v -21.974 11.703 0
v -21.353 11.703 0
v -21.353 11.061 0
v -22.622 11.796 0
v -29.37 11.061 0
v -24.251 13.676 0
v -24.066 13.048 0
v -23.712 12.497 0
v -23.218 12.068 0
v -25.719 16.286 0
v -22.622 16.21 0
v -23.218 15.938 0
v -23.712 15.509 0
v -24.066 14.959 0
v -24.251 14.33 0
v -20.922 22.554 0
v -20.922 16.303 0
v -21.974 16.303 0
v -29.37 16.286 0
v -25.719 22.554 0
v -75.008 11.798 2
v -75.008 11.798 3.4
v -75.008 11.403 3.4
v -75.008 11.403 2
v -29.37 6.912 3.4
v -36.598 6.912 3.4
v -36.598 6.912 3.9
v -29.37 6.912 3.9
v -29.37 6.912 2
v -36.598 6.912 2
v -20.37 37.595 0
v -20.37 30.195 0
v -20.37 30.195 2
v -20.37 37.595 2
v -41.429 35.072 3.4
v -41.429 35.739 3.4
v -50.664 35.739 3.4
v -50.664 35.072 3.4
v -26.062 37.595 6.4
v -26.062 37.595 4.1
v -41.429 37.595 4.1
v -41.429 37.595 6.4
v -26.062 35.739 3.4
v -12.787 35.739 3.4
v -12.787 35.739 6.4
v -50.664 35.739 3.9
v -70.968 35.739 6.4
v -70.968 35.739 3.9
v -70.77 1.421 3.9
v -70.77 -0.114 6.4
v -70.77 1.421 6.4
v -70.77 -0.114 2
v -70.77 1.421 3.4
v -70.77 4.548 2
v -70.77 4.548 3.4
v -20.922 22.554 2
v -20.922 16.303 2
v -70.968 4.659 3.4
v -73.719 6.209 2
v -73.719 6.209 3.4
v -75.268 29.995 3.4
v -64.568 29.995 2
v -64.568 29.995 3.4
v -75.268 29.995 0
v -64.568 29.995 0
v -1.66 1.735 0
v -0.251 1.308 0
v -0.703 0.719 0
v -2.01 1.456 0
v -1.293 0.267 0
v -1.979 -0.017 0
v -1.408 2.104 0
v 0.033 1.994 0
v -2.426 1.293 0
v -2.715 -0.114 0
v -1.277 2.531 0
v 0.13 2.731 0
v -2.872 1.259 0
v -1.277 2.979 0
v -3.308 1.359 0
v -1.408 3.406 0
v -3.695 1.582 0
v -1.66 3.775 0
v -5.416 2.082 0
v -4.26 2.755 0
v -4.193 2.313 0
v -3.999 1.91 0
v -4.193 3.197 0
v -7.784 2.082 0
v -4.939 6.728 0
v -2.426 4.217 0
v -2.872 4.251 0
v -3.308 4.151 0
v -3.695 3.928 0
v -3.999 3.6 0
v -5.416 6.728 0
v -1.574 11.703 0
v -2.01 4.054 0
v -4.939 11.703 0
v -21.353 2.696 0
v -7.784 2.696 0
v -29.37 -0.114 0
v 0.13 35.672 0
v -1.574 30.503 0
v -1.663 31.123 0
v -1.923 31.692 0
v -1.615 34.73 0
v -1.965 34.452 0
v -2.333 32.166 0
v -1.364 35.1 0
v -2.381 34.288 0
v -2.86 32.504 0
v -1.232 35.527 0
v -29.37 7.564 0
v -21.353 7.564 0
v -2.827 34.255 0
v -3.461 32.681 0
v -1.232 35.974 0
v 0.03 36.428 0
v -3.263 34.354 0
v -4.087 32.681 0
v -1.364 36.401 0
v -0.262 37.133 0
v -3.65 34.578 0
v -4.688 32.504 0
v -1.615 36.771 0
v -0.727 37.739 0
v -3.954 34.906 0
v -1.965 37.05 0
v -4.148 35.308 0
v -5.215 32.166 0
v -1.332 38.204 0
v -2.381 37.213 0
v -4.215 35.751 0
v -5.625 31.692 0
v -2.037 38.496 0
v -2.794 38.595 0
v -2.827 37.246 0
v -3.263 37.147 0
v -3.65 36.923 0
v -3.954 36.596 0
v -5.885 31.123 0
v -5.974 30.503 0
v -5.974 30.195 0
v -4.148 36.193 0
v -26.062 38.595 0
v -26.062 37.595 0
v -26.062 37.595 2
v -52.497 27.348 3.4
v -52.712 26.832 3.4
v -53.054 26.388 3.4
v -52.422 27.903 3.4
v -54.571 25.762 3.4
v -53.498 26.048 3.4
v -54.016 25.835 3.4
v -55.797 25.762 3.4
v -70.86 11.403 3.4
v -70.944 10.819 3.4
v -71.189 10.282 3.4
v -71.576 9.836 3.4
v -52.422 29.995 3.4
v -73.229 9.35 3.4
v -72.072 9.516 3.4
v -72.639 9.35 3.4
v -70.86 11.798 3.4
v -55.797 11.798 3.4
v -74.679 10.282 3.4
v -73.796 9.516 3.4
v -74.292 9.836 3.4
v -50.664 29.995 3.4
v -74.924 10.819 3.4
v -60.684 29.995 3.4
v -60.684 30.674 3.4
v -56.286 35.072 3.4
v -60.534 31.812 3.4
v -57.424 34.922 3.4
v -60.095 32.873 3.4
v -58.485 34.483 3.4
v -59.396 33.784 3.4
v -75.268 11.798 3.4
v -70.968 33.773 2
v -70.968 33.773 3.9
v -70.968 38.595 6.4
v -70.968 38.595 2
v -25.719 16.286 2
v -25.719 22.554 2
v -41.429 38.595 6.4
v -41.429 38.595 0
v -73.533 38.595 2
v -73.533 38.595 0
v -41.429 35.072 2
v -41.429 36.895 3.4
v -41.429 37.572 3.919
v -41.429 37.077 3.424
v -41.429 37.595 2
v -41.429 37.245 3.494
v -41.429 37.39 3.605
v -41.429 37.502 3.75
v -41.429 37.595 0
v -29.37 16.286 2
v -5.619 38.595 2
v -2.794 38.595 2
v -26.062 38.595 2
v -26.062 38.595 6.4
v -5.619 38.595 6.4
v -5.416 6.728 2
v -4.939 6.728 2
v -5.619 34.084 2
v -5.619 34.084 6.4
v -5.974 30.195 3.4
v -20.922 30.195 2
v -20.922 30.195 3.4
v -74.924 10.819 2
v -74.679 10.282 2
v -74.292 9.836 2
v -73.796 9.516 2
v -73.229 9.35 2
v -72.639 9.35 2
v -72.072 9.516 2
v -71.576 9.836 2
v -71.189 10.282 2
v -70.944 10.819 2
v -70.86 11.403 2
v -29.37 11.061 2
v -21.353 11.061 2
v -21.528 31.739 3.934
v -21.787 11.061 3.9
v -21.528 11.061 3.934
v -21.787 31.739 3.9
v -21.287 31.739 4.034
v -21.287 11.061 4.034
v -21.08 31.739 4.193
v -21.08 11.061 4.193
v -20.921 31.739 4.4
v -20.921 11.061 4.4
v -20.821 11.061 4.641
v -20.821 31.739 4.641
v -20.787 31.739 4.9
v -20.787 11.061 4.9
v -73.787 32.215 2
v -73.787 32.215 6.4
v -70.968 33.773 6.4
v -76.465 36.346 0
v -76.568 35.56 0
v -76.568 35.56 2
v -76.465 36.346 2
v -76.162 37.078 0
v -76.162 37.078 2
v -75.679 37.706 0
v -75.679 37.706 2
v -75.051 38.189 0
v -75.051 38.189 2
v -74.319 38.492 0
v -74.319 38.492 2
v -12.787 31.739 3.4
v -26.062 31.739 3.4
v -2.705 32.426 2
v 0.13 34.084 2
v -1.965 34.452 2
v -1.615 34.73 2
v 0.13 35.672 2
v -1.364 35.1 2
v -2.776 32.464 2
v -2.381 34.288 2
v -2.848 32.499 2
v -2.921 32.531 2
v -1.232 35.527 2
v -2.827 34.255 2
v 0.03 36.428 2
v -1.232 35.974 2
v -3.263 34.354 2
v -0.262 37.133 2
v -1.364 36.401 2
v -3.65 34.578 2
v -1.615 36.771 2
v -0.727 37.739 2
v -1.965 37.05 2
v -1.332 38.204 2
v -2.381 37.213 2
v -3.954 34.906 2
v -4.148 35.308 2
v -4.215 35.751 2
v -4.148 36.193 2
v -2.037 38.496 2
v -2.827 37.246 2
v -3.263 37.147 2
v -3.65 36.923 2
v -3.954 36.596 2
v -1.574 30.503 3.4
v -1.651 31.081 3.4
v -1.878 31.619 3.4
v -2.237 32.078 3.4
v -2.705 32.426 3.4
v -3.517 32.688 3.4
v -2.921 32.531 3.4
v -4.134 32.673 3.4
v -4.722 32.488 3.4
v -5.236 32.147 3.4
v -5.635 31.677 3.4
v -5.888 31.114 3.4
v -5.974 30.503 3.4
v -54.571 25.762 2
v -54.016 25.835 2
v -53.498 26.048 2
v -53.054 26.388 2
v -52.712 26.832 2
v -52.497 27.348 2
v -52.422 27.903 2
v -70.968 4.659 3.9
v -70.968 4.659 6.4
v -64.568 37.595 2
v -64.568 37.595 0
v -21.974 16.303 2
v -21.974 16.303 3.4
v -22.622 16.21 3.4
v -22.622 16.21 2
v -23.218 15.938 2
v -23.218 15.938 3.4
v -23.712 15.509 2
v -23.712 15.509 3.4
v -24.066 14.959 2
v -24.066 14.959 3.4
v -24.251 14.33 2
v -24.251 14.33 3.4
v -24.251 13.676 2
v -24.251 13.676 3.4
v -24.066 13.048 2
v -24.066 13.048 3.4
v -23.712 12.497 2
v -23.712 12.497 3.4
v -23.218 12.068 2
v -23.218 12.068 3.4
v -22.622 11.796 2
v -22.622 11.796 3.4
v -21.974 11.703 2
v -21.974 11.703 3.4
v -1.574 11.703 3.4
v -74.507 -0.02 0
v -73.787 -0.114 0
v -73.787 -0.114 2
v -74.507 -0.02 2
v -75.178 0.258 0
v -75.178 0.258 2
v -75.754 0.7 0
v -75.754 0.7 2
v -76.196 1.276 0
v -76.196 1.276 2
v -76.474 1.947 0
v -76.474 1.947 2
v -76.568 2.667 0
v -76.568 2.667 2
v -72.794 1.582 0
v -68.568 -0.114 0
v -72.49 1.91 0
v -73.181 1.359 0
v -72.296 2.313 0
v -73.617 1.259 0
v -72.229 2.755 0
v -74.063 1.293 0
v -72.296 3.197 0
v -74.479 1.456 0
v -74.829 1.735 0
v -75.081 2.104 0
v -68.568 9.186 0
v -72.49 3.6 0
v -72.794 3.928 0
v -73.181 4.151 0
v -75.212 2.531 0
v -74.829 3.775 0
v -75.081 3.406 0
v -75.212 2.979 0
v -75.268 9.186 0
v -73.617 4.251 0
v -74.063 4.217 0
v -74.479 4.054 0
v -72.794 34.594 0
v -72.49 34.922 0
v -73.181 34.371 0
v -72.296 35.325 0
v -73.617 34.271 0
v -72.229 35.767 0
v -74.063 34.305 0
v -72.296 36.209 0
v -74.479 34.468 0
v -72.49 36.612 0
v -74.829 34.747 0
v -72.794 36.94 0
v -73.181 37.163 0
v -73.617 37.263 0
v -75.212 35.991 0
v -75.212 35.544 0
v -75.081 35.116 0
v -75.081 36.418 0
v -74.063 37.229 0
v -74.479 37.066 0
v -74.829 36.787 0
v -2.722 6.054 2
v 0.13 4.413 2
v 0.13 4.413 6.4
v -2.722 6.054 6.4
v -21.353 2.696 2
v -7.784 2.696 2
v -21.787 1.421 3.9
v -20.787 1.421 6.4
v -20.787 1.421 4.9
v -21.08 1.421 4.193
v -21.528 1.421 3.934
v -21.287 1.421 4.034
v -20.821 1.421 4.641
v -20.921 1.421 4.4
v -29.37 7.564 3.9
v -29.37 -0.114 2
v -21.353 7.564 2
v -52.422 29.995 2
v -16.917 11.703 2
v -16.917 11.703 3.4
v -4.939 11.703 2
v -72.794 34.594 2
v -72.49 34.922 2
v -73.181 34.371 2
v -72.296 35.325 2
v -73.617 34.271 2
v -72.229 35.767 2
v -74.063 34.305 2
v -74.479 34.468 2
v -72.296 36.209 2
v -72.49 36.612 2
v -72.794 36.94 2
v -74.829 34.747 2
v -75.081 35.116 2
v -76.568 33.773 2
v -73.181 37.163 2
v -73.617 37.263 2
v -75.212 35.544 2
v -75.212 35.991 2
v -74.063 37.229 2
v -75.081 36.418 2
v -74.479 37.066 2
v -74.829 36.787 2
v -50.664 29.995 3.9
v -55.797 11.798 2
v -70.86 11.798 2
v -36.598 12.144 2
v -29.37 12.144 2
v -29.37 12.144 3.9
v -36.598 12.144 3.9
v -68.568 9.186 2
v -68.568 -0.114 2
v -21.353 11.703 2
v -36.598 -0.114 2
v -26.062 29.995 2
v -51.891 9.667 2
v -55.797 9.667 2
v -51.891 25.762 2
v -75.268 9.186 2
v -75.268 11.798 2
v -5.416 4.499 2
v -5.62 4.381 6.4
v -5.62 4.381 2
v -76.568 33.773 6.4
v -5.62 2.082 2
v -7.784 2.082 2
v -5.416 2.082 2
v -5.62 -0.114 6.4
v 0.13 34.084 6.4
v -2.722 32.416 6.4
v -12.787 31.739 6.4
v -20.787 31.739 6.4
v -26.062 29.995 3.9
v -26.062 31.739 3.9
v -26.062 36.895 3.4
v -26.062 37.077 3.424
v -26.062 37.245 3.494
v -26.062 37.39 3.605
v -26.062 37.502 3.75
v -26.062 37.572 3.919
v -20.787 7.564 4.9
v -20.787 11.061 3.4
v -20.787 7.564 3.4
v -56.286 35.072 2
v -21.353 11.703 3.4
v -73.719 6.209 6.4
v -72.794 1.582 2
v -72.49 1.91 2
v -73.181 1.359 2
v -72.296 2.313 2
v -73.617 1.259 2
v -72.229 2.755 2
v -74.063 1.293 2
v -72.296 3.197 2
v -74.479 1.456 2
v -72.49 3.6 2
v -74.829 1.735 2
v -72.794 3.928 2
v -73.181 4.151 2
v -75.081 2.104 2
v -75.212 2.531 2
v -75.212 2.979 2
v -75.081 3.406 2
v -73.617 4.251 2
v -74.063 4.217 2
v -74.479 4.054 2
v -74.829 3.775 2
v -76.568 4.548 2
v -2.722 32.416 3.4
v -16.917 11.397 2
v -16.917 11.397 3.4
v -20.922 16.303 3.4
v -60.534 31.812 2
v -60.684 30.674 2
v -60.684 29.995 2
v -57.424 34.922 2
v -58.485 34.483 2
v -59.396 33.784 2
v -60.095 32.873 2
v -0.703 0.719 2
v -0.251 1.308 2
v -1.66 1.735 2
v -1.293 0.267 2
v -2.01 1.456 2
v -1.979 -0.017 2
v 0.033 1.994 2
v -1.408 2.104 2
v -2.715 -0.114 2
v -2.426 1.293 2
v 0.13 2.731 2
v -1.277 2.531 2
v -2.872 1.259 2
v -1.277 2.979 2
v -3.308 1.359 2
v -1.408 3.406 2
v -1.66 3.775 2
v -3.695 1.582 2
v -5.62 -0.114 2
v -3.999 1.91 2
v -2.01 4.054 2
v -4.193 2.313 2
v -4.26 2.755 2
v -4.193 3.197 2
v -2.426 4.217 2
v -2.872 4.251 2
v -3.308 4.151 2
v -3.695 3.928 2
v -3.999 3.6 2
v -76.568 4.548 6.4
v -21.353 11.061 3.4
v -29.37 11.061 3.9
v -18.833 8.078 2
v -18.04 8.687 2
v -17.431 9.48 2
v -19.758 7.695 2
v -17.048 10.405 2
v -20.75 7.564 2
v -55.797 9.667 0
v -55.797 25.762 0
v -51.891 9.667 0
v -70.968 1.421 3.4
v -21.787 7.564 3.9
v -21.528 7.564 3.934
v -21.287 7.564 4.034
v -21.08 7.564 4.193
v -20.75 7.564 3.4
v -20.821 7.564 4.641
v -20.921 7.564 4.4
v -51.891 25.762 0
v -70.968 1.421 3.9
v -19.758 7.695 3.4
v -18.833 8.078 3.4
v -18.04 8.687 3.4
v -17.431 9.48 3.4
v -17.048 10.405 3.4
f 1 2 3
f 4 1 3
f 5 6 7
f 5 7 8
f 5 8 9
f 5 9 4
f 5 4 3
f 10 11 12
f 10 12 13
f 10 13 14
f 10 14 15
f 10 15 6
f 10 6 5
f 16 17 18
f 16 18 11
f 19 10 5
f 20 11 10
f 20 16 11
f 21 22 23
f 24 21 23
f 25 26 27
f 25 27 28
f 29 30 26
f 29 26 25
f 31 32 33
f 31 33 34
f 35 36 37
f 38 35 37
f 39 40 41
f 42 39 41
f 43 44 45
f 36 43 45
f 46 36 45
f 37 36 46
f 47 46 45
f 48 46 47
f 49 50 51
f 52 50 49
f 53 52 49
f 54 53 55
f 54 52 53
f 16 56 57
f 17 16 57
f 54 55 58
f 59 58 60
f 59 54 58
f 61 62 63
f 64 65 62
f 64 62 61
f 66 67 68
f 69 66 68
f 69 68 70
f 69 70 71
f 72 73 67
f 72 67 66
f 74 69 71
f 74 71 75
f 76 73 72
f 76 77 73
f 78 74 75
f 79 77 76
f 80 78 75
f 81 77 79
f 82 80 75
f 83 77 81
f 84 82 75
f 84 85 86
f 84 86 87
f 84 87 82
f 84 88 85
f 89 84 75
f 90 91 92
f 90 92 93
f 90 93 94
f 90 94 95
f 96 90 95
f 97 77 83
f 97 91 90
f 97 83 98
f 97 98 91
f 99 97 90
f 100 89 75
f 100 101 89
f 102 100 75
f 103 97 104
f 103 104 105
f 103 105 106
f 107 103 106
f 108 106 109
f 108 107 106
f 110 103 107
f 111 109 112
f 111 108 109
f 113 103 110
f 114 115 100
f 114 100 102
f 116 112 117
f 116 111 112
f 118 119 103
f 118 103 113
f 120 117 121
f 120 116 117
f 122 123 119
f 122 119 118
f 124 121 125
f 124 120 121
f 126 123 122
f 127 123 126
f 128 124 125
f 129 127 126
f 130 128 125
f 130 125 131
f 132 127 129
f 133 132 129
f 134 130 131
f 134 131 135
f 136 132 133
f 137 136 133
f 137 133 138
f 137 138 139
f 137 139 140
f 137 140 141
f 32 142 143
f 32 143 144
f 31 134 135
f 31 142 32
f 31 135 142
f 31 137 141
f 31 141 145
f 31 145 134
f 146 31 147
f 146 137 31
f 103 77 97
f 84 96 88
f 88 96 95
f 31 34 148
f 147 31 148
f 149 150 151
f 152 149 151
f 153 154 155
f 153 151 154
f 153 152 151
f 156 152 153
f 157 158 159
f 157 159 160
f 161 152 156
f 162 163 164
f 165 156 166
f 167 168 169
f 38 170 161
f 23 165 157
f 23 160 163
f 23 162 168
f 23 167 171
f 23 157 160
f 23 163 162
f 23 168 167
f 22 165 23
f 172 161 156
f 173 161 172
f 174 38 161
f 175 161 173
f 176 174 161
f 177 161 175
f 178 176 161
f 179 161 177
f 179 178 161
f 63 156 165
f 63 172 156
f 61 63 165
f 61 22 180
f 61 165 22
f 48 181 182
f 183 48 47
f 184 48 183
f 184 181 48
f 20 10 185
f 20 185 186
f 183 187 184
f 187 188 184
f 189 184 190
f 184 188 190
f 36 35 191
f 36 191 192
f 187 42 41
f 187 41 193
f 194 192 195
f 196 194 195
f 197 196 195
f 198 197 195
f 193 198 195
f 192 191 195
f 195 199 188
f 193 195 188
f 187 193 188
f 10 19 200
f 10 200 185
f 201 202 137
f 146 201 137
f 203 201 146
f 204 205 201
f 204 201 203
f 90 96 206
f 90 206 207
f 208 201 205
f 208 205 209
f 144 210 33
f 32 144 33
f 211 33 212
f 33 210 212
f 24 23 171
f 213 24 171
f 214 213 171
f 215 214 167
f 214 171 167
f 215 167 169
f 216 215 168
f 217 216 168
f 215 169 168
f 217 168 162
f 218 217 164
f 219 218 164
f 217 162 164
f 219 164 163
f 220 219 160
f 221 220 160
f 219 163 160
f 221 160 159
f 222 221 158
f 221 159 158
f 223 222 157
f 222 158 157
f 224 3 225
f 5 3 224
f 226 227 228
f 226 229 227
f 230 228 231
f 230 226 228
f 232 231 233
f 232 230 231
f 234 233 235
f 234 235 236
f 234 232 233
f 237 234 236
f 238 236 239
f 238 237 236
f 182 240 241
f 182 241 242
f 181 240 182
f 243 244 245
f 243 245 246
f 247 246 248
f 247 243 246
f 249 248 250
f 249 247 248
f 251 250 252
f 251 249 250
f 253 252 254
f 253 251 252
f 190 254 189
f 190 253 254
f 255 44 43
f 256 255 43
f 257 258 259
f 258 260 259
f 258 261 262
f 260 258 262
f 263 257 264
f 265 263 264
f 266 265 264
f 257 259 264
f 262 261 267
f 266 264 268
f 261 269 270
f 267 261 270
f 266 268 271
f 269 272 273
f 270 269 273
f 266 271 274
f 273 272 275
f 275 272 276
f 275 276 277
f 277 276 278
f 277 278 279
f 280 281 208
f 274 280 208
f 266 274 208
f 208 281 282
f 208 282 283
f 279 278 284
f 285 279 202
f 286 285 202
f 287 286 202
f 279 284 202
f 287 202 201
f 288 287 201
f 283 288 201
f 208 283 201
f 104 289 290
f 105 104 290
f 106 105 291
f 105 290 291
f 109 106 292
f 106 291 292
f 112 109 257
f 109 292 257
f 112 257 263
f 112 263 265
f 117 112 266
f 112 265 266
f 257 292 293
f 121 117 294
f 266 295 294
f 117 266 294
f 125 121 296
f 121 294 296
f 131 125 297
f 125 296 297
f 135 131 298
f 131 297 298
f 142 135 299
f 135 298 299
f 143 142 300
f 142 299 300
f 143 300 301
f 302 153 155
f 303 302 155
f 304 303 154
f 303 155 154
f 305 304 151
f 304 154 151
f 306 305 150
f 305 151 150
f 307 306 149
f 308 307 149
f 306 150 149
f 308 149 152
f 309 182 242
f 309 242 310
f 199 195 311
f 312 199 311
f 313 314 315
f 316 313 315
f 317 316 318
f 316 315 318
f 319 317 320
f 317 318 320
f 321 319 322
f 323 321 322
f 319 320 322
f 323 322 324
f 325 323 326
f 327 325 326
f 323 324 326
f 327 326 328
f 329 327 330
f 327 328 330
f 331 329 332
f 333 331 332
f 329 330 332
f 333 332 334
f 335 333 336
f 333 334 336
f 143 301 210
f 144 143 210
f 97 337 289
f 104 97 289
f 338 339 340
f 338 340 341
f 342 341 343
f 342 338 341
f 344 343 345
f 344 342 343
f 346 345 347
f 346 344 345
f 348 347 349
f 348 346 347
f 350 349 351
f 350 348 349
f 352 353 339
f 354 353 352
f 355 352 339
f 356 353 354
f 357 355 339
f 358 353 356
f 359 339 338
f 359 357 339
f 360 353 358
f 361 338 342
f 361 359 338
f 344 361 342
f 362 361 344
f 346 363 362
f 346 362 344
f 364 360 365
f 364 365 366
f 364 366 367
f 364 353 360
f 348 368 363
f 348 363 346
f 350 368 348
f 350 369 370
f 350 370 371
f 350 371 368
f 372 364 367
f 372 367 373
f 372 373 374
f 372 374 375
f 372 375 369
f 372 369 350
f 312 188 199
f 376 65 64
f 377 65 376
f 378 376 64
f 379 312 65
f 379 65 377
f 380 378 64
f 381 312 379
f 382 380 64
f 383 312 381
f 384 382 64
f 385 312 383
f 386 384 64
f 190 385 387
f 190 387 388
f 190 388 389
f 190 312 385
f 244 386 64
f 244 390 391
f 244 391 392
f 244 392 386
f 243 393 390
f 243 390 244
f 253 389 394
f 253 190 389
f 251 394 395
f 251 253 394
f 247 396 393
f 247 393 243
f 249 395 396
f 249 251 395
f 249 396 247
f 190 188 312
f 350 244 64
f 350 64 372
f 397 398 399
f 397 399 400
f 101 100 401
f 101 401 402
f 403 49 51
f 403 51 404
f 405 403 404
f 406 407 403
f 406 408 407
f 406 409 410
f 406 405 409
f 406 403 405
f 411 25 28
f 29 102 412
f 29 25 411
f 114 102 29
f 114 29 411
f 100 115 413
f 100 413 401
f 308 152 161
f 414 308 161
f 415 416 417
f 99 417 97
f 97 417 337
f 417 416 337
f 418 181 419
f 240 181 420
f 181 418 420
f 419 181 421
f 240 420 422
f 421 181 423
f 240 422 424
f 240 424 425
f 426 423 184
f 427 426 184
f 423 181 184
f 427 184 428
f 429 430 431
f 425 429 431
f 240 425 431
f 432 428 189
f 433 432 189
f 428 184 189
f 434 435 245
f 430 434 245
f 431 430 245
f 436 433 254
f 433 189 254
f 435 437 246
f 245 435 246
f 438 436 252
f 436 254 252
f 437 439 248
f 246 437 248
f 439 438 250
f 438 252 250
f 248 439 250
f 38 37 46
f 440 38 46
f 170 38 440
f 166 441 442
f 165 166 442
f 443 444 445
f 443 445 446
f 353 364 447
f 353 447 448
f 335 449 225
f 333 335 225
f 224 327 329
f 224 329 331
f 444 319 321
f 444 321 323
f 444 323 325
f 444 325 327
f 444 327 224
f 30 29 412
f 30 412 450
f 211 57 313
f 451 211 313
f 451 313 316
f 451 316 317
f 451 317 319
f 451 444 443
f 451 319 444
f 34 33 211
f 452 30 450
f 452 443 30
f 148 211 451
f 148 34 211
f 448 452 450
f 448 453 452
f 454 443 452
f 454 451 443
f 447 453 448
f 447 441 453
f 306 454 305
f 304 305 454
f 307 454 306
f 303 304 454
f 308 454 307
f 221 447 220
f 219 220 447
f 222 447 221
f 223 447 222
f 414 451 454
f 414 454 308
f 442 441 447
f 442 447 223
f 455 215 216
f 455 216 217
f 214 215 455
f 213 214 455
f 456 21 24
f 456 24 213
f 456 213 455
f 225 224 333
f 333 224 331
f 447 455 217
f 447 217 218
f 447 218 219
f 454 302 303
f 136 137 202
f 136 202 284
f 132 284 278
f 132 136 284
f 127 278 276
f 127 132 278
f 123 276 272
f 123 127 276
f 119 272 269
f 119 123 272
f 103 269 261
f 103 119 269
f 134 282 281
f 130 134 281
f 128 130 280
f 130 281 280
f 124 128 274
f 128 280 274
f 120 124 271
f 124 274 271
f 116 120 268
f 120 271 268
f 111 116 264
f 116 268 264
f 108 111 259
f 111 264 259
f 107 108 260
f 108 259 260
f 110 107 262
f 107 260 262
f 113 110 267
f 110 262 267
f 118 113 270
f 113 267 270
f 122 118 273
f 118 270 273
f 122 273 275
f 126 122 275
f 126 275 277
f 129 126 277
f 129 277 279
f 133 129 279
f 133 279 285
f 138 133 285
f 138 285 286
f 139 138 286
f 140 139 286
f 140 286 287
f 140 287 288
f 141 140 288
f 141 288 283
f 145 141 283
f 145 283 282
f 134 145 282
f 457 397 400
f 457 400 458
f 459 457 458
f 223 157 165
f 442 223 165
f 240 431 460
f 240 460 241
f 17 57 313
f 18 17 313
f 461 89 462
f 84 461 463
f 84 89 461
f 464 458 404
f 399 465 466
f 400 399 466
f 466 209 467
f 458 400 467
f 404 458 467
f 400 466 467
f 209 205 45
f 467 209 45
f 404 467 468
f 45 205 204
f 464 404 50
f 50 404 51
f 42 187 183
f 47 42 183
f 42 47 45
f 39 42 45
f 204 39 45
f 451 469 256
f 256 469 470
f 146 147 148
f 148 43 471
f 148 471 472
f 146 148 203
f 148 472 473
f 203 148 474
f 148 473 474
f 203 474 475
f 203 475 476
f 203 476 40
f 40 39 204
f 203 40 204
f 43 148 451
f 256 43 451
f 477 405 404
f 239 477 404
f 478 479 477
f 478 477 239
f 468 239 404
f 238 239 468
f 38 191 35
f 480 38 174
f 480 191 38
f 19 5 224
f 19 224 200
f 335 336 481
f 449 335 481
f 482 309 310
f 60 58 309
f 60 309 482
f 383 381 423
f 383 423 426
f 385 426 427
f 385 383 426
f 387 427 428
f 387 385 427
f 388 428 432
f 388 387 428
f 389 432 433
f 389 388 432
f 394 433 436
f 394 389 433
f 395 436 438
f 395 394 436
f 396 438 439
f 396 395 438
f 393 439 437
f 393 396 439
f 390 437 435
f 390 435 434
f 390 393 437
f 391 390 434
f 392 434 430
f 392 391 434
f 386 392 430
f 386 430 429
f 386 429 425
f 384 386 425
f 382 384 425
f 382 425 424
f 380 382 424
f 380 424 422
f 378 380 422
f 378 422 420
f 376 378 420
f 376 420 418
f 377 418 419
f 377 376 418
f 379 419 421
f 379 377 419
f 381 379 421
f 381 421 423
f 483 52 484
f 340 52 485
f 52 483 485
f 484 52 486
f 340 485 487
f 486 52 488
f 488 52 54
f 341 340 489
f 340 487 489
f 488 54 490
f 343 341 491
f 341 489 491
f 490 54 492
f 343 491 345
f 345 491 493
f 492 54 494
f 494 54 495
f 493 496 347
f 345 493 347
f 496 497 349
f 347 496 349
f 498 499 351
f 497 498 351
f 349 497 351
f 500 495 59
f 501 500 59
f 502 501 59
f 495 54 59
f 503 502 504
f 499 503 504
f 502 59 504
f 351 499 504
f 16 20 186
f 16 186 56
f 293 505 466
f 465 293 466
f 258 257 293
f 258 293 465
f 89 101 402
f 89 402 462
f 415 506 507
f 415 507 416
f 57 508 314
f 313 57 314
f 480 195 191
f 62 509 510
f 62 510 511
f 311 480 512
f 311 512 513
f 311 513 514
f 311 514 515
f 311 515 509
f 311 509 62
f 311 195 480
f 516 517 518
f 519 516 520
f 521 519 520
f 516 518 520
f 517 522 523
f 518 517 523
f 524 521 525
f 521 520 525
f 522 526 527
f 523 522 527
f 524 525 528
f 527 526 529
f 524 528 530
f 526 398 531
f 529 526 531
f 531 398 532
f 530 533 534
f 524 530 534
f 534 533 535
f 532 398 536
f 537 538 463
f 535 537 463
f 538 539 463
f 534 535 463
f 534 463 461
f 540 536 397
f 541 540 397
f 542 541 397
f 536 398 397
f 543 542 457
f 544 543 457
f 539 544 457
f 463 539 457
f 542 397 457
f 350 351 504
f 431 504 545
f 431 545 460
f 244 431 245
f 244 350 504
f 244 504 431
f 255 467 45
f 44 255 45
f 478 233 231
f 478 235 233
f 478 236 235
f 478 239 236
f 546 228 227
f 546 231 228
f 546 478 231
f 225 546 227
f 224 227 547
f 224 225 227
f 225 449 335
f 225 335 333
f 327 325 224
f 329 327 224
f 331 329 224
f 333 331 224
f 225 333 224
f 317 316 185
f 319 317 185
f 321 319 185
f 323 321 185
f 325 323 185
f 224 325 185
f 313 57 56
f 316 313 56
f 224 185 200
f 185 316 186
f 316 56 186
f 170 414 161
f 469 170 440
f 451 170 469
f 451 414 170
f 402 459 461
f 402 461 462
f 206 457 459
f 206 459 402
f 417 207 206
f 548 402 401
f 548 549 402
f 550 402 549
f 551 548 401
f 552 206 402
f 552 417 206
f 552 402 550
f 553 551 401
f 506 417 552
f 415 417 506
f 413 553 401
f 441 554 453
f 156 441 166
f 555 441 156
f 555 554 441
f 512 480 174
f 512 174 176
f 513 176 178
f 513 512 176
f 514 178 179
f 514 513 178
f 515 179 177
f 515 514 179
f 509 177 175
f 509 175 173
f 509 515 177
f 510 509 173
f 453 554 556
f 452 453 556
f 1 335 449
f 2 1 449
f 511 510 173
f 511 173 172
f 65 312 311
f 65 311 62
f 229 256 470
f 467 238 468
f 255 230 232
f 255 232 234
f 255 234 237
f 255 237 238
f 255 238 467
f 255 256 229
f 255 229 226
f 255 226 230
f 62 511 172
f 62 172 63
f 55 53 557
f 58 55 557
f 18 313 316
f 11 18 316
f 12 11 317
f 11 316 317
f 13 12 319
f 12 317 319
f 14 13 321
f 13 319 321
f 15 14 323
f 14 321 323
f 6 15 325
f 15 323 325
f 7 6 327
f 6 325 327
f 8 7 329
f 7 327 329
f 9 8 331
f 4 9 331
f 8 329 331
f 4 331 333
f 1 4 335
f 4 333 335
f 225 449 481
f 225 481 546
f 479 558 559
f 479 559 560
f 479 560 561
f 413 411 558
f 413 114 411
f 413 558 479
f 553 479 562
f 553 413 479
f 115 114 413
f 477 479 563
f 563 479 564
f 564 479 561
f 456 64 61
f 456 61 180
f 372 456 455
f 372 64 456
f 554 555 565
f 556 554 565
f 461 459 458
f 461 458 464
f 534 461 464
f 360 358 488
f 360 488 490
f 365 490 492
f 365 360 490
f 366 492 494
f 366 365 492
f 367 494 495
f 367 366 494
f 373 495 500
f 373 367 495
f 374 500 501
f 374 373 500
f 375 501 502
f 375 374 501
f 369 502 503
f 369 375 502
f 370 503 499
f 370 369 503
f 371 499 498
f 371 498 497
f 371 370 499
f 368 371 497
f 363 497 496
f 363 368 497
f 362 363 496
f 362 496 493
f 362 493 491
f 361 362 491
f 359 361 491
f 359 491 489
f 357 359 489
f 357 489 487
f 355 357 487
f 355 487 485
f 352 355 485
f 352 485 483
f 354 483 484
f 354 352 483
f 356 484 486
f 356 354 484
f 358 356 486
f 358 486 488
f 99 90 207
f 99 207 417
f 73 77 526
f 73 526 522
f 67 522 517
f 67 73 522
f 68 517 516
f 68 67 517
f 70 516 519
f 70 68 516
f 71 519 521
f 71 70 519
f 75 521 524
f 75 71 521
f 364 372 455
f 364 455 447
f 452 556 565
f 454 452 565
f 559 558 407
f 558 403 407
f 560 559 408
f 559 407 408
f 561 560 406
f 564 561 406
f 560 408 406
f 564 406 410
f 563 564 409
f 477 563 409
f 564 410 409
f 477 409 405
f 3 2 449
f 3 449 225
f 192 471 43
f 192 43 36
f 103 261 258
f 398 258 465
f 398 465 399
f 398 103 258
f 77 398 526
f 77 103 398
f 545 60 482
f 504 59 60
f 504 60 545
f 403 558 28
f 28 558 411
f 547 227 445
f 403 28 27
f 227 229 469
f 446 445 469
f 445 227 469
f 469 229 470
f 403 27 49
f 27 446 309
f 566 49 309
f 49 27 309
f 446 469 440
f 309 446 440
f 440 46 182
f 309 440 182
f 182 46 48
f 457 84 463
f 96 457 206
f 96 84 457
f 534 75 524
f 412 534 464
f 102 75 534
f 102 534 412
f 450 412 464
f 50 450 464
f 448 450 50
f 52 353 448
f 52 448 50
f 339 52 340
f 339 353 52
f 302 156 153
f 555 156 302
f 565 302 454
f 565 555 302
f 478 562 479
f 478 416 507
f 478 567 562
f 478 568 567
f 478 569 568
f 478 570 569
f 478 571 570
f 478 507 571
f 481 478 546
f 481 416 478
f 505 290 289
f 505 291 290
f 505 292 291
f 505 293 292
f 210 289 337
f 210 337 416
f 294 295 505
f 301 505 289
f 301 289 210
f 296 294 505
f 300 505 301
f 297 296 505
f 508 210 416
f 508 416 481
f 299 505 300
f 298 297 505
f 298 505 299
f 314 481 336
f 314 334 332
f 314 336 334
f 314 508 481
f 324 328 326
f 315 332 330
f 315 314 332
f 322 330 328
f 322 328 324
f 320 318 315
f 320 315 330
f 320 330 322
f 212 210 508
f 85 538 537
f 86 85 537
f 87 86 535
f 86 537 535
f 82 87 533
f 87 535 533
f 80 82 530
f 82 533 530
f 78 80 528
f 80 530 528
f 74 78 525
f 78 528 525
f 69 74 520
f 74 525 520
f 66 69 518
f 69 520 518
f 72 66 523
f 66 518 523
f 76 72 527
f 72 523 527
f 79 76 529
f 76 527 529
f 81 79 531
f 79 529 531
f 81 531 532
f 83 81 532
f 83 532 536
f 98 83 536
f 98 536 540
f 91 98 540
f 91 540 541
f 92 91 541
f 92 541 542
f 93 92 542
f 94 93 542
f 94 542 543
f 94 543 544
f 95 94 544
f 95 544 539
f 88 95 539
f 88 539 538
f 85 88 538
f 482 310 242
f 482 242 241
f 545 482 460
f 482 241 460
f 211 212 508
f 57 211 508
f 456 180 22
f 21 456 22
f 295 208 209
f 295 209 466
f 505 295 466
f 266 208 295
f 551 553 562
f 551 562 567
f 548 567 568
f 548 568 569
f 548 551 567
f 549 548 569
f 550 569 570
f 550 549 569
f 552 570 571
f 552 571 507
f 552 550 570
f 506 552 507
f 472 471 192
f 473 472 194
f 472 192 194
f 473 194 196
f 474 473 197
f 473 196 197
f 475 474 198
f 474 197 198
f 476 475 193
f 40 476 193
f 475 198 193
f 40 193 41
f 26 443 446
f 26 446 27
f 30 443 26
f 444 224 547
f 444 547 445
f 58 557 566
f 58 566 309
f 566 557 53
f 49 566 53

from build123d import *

# Parameters (mm, degrees)
SKETCH_1_R          = 1.5
EXTRUDE_1_DEPTH     = 2
EXTRUDE_1_2_DEPTH   = 2
EXTRUDE_1_3_DEPTH   = 2
SKETCH_1_W          = 4.106423221
SKETCH_1_H          = 16.094809644
EXTRUDE_1_4_DEPTH   = 2
EXTRUDE_2_DEPTH     = 1.4
SKETCH_3_W          = 7.227966662
SKETCH_3_H          = 7.026031467
EXTRUDE_3_DEPTH     = 1.4
SKETCH_4_R          = 1.5
CUT_EXTRUDE_1_DEPTH = 4
EXTRUDE_4_DEPTH     = 3
SKETCH_6_W          = 8
SKETCH_6_H          = 4
CUT_EXTRUDE_2_DEPTH = 3
SKETCH_7_W          = 15.36645454
SKETCH_7_H          = 1
CUT_EXTRUDE_3_DEPTH = 10
FILLET_1_R          = 0.7
CUT_EXTRUDE_START   = -3.4
CUT_EXTRUDE_4_DEPTH = 3.4
SKETCH_9_W          = 0.2
SKETCH_9_H          = 16.094809644
CUT_EXTRUDE_5_DEPTH = 2
SKETCH_10_W         = 0.2
SKETCH_10_H         = 13.963463774
CUT_EXTRUDE_6_DEPTH = 1.4
EXTRUDE_5_DEPTH     = 0.5
FILLET_2_R          = 1
SKETCH_12_W         = 5.692016437
SKETCH_12_H         = 1
SKETCH_12_W_2       = 23.13982976
EXTRUDE_6_DEPTH     = 2


with BuildPart() as part:
    # 草图1 → 凸台-拉伸1 (new body)
    with BuildSketch(Plane.XY):
        with BuildLine():
            Line((-73.533147066, 38.595377191), (-64.568453137, 38.595377191))
            Line((-64.568453137, 38.595377191), (-64.568453137, 29.995377191))
            Line((-64.568453137, 29.995377191), (-75.268453137, 29.995377191))
            Line((-75.268453137, 29.995377191), (-75.268453137, 9.185699771))
            Line((-75.268453137, 9.185699771), (-68.568453137, 9.185699771))
            Line((-68.568453137, 9.185699771), (-68.568453137, -0.114300229))
            Line((-68.568453137, -0.114300229), (-73.787147574, -0.114300229))
            ThreePointArc((-73.787147574, -0.114300229), (-75.753827598, 0.70032531), (-76.568453137, 2.667005334))
            Line((-76.568453137, 2.667005334), (-76.568453137, 35.56007112))
            ThreePointArc((-76.568453137, 35.56007112), (-75.679432572, 37.706356626), (-73.533147066, 38.595377191))
        make_face()
        with Locations((-73.729232918, 35.767081534)):
            Circle(SKETCH_1_R, mode=Mode.SUBTRACT)
        with Locations((-73.729232918, 2.75501651)):
            Circle(SKETCH_1_R, mode=Mode.SUBTRACT)
    extrude(amount=EXTRUDE_1_DEPTH)



with BuildPart() as body_2:
    # 草图1 → Extrude 1 2 (new body)
    with BuildSketch(Plane.XY):
        with BuildLine():
            Line((-20.3701524, 38.595377191), (-2.794005588, 38.595377191))
            ThreePointArc((-2.794005588, 38.595377191), (-0.726529172, 37.739000419), (0.1298476, 35.671524003))
            Line((0.1298476, 35.671524003), (0.1298476, 2.730505461))
            ThreePointArc((0.1298476, 2.730505461), (-0.703376696, 0.718924067), (-2.71495809, -0.114300229))
            Line((-2.71495809, -0.114300229), (-29.3701524, -0.114300229))
            Line((-29.3701524, -0.114300229), (-29.3701524, 7.564313638))
            Line((-29.3701524, 7.564313638), (-21.352987273, 7.564313638))
            Line((-21.352987273, 7.564313638), (-21.352987273, 2.696314027))
            Line((-21.352987273, 2.696314027), (-7.783666391, 2.696314027))
            Line((-7.783666391, 2.696314027), (-7.783666391, 2.08224545))
            Line((-7.783666391, 2.08224545), (-5.4155429, 2.08224545))
            Line((-5.4155429, 2.08224545), (-5.4155429, 6.727722904))
            Line((-5.4155429, 6.727722904), (-4.939400428, 6.727722904))
            Line((-4.939400428, 6.727722904), (-4.939400428, 11.903025146))
            Line((-4.939400428, 11.903025146), (-1.774003048, 11.903025146))
            Line((-1.774003048, 11.903025146), (-1.774003048, 30.503061971))
            ThreePointArc((-1.774003048, 30.503061971), (-3.774007689, 32.503066612), (-5.774012331, 30.503061971))
            Line((-5.774012331, 30.503061971), (-5.774012331, 29.995362765))
            Line((-5.774012331, 29.995362765), (-20.3701524, 29.995362765))
            Line((-20.3701524, 29.995362765), (-20.3701524, 38.595377191))
        make_face()
    extrude(amount=EXTRUDE_1_2_DEPTH)

    # 草图2 → 凸台-拉伸2 (add)
    with BuildSketch(Plane.XY.offset(2)):
        with BuildLine():
            Line((-20.3701524, 38.595377191), (-5.61889189, 38.595377191))
            Line((-5.61889189, 38.595377191), (-5.61889189, 34.083758146))
            Line((-5.61889189, 34.083758146), (-2.721714642, 32.416318003))
            Line((-2.721714642, 32.416318003), (0.1298476, 34.083758146))
            Line((0.1298476, 34.083758146), (0.1298476, 4.412767613))
            Line((0.1298476, 4.412767613), (-2.721714642, 6.053954515))
            Line((-2.721714642, 6.053954515), (-5.620189722, 4.380519147))
            Line((-5.620189722, 4.380519147), (-5.620189722, -0.114300229))
            Line((-5.620189722, -0.114300229), (-29.3701524, -0.114300229))
            Line((-29.3701524, -0.114300229), (-29.3701524, 7.564313638))
            Line((-29.3701524, 7.564313638), (-21.352987273, 7.564313638))
            Line((-21.352987273, 7.564313638), (-20.749621985, 7.564313638))
            ThreePointArc((-20.749621985, 7.564313638), (-18.039737166, 8.686784683), (-16.917266121, 11.396669503))
            Line((-16.917266121, 11.396669503), (-16.917266121, 11.903025146))
            Line((-16.917266121, 11.903025146), (-4.939400428, 11.903025146))
            Line((-4.939400428, 11.903025146), (-1.774003048, 11.903025146))
            Line((-1.774003048, 11.903025146), (-1.774003048, 30.503061971))
            ThreePointArc((-1.774003048, 30.503061971), (-3.774007689, 32.503066612), (-5.774012331, 30.503061971))
            Line((-5.774012331, 30.503061971), (-5.774012331, 29.995362765))
            Line((-5.774012331, 29.995362765), (-20.3701524, 29.995362765))
            Line((-20.3701524, 29.995362765), (-20.3701524, 38.595377191))
        make_face()
        with BuildLine():
            Line((-70.887589638, 38.595377191), (-41.428623377, 38.595377191))
            Line((-41.428623377, 38.595377191), (-41.428623377, 35.071751605))
            Line((-41.428623377, 35.071751605), (-56.286166586, 35.071751605))
            ThreePointArc((-56.286166586, 35.071751605), (-59.39593239, 33.783644433), (-60.684039561, 30.673878629))
            Line((-60.684039561, 30.673878629), (-60.684039561, 29.995362765))
            Line((-60.684039561, 29.995362765), (-64.568453137, 29.995377191))
            Line((-64.568453137, 29.995377191), (-75.268453137, 29.995377191))
            Line((-75.268453137, 29.995377191), (-75.268453137, 9.185699771))
            Line((-75.268453137, 9.185699771), (-68.568453137, 9.185699771))
            Line((-68.568453137, 9.185699771), (-68.568453137, 11.798156954))
            Line((-68.568453137, 11.798156954), (-55.996988093, 11.798156954))
            Line((-55.996988093, 11.798156954), (-55.996988093, 25.761620728))
            Line((-55.996988093, 25.761620728), (-51.890564872, 25.761620728))
            Line((-51.890564872, 25.761620728), (-51.890564872, 29.995362765))
            Line((-51.890564872, 29.995362765), (-21.162764526, 29.995362765))
            Line((-21.162764526, 29.995362765), (-20.622217716, 29.369045696))
            Line((-20.622217716, 29.369045696), (-20.622217716, 22.554127025))
            Line((-20.622217716, 22.554127025), (-20.622217716, 16.103096986))
            Line((-20.622217716, 16.103096986), (-21.974006869, 16.103096986))
            ThreePointArc((-21.974006869, 16.103096986), (-24.074042789, 14.003061066), (-21.974006869, 11.903025146))
            Line((-21.974006869, 11.903025146), (-21.352987273, 11.903025146))
            Line((-21.352987273, 11.903025146), (-21.352987273, 11.060546498))
            Line((-21.352987273, 11.060546498), (-29.3701524, 11.060546498))
            Line((-29.3701524, 11.060546498), (-29.3701524, 12.144142136))
            Line((-29.3701524, 12.144142136), (-36.598119062, 12.144142136))
            Line((-36.598119062, 12.144142136), (-36.598119062, -0.114300229))
            Line((-36.598119062, -0.114300229), (-70.770319773, -0.114300229))
            Line((-70.770319773, -0.114300229), (-70.770319773, 4.547869094))
            Line((-70.770319773, 4.547869094), (-73.7192537, 6.209024912))
            Line((-73.7192537, 6.209024912), (-76.568453137, 4.547869094))
            Line((-76.568453137, 4.547869094), (-76.568453137, 33.773368738))
            Line((-76.568453137, 33.773368738), (-73.787147574, 32.214579336))
            Line((-73.787147574, 32.214579336), (-70.968453137, 33.773368738))
            Line((-70.968453137, 33.773368738), (-70.968453137, 38.595377191))
            Line((-70.968453137, 38.595377191), (-70.887589638, 38.595377191))
        make_face()
    extrude(amount=EXTRUDE_2_DEPTH)


with BuildPart() as body_3:
    # 草图1 → Extrude 1 3 (new body)
    with BuildSketch(Plane.XY):
        with BuildLine():
            Line((-29.3701524, 16.285673783), (-25.719430689, 16.285673783))
            Line((-25.719430689, 16.285673783), (-25.719430689, 22.554127025))
            Line((-25.719430689, 22.554127025), (-20.622217716, 22.554127025))
            Line((-20.622217716, 22.554127025), (-20.622217716, 16.103096986))
            Line((-20.622217716, 16.103096986), (-21.974006869, 16.103096986))
            ThreePointArc((-21.974006869, 16.103096986), (-24.074042789, 14.003061066), (-21.974006869, 11.903025146))
            Line((-21.974006869, 11.903025146), (-21.352987273, 11.903025146))
            Line((-21.352987273, 11.903025146), (-21.352987273, 11.060546498))
            Line((-21.352987273, 11.060546498), (-29.3701524, 11.060546498))
            Line((-29.3701524, 11.060546498), (-29.3701524, 16.285673783))
        make_face()
    extrude(amount=EXTRUDE_1_3_DEPTH)


with BuildPart() as body_4:
    # 草图1 → Extrude 1 4 (new body)
    with BuildSketch(Plane.XY):
        with Locations((-53.943776483, 17.714215906)):
            Rectangle(SKETCH_1_W, SKETCH_1_H)
    extrude(amount=EXTRUDE_1_4_DEPTH)


with BuildPart() as extrude_2_piece_1:
    # of the separate pieces the step leaves, piece 1, a body of its own (extrude_2_pieces)
    add(body_2.part.solids().sort_by_distance((-41.428623377, 38.595377191, 2))[0])


with BuildPart() as extrude_2_piece_2:
    # of the separate pieces the step leaves, piece 2, a body of its own (extrude_2_pieces)
    add(body_2.part.solids().sort_by_distance((-5.774012331, 30.503061971, 0))[0])


with BuildPart() as part_1:
    add(part.part)

    add(body_4.part)  # 凸台-拉伸3 merges body 4

    add(extrude_2_piece_1.part)  # 凸台-拉伸3 merges 凸台-拉伸2 piece 1

    add(extrude_2_piece_2.part)  # 凸台-拉伸3 merges 凸台-拉伸2 piece 2
    # 草图3 → 凸台-拉伸3 (add)
    with BuildSketch(Plane.XY.offset(3.4)):
        Polygon((-20.3701524, 38.595377191), (-20.3701524, 29.995362765), (-20.622217716, 29.995362765), (-20.622217716, 29.369045696), (-21.162764526, 29.995362765), (-26.062168837, 29.995362765), (-26.062168837, 38.595377191), align=None)
        with Locations((-32.984135731, 3.398715505)):
            Rectangle(SKETCH_3_W, SKETCH_3_H)
        with BuildLine():
            Line((-72.936706259, 9.185699771), (-75.268453137, 9.185699771))
            Line((-75.268453137, 9.185699771), (-75.268453137, 11.40305698))
            Line((-75.268453137, 11.40305698), (-75.268453137, 11.798156954))
            Line((-75.268453137, 11.798156954), (-75.008222616, 11.798156954))
            Line((-75.008222616, 11.798156954), (-75.008222616, 11.40305698))
            ThreePointArc((-75.008222616, 11.40305698), (-72.934110955, 9.328945319), (-70.859999295, 11.40305698))
            Line((-70.859999295, 11.40305698), (-70.859999295, 11.798156954))
            Line((-70.859999295, 11.798156954), (-68.568453137, 11.798156954))
            Line((-68.568453137, 11.798156954), (-68.568453137, 9.185699771))
            Line((-68.568453137, 9.185699771), (-72.936706259, 9.185699771))
        make_face()
        with BuildLine():
            Line((-51.890564872, 27.903055626), (-51.890564872, 25.761620728))
            Line((-51.890564872, 25.761620728), (-54.570638132, 25.761620728))
            ThreePointArc((-54.570638132, 25.761620728), (-53.053936471, 26.388408915), (-52.422198631, 27.903055626))
            Line((-52.422198631, 27.903055626), (-52.422198631, 29.995362765))
            Line((-52.422198631, 29.995362765), (-51.890564872, 29.995362765))
            Line((-51.890564872, 29.995362765), (-51.890564872, 27.903055626))
        make_face()
    extrude(amount=-EXTRUDE_3_DEPTH)

    # 草图4 → 切除-拉伸1 (cut)
    with BuildSketch(Plane.XY.offset(3.4)):
        with Locations(Location((-2.71495809, 35.750571501, 0), (0, 0, 180))):
            Circle(SKETCH_4_R)
        with Locations(Location((-2.75986538, 2.75501651, 0), (0, 0, 180))):
            Circle(SKETCH_4_R)
    extrude(amount=-CUT_EXTRUDE_1_DEPTH, mode=Mode.SUBTRACT)

    # 草图5 → 凸台-拉伸4 (add)
    with BuildSketch(Plane.XY.offset(3.4)):
        Polygon((-26.062168837, 38.595377191), (-5.61889189, 38.595377191), (-5.61889189, 34.083758146), (-2.721714642, 32.416318003), (0.1298476, 34.083758146), (0.1298476, 4.412767613), (-2.721714642, 6.053954515), (-5.620189722, 4.380519147), (-5.620189722, -0.114300229), (-70.770319773, -0.114300229), (-70.770319773, 1.42117871), (-20.786805854, 1.42117871), (-20.786805854, 35.738925441), (-70.968453137, 35.738925441), (-70.968453137, 38.595377191), align=None)
        Polygon((-76.568453137, 33.773368738), (-73.787147574, 32.214579336), (-70.968453137, 33.773368738), (-70.968453137, 4.659479052), (-73.7192537, 6.209024912), (-76.568453137, 4.547869094), align=None)
    extrude(amount=EXTRUDE_4_DEPTH)

    # 草图6 → 切除-拉伸2 (cut)
    with BuildSketch(Plane.XY.offset(6.4)):
        with Locations((-16.786805854, 33.738925441)):
            Rectangle(SKETCH_6_W, SKETCH_6_H)
    extrude(amount=-CUT_EXTRUDE_2_DEPTH, mode=Mode.SUBTRACT)

    # 草图7 → 切除-拉伸3 (cut)
    with BuildSketch(Plane(origin=(0, 0, 3.4), x_dir=(-1, 0, 0), z_dir=(0, 0, -1))):
        with Locations((33.745396107, 38.095377191)):
            Rectangle(SKETCH_7_W, SKETCH_7_H)
    extrude(amount=-CUT_EXTRUDE_3_DEPTH, mode=Mode.SUBTRACT)

    # 圆角1
    fillet_1_edges = [part_1.edges().sort_by_distance(p)[0] for p in [
        (-33.745396107, 37.595377191, 3.4),
    ]]
    fillet(fillet_1_edges, radius=FILLET_1_R)


with BuildPart() as cut_extrude_4_tool:
    # 草图8 → 切除-拉伸4 (new body)
    with BuildSketch(Plane(origin=(0, 0, 0), x_dir=(-1, 0, 0), z_dir=(0, 0, -1)).offset(CUT_EXTRUDE_START)):
        with BuildLine():
            Line((5.974012331, 30.195362765), (20.922217716, 30.195362765))
            Line((20.922217716, 30.195362765), (20.922217716, 16.303096986))
            Line((20.922217716, 16.303096986), (21.974006869, 16.303096986))
            ThreePointArc((21.974006869, 16.303096986), (24.274042789, 14.003061066), (21.974006869, 11.703025146))
            Line((21.974006869, 11.703025146), (20.922217716, 11.703025146))
            Line((20.922217716, 11.703025146), (1.574003048, 11.703025146))
            Line((1.574003048, 11.703025146), (1.574003048, 30.295362765))
            Line((1.574003048, 30.295362765), (1.574003048, 30.503061971))
            ThreePointArc((1.574003048, 30.503061971), (3.774007689, 32.703066612), (5.974012331, 30.503061971))
            Line((5.974012331, 30.503061971), (5.974012331, 30.195362765))
        make_face()
    extrude(amount=CUT_EXTRUDE_4_DEPTH)


with BuildPart() as part_2:
    add(part_1.part)

    # 切除-拉伸4: cut by cut_extrude_4_tool
    add(cut_extrude_4_tool.part, mode=Mode.SUBTRACT)

    # 草图9 → 切除-拉伸5 (cut)
    with BuildSketch(Plane(origin=(0, 0, 0), x_dir=(-1, 0, 0), z_dir=(0, 0, -1))):
        with Locations((55.896988093, 17.714215906)):
            Rectangle(SKETCH_9_W, SKETCH_9_H)
    extrude(amount=-CUT_EXTRUDE_5_DEPTH, mode=Mode.SUBTRACT)

    # 草图10 → 切除-拉伸6 (cut)
    with BuildSketch(Plane(origin=(0, 0, 2), x_dir=(-1, 0, 0), z_dir=(0, 0, -1))):
        with Locations((55.896988093, 18.779888841)):
            Rectangle(SKETCH_10_W, SKETCH_10_H)
    extrude(amount=-CUT_EXTRUDE_6_DEPTH, mode=Mode.SUBTRACT)

    # 草图11 → 凸台-拉伸5 (add)
    with BuildSketch(Plane.XY.offset(3.4)):
        Polygon((-70.968453137, 35.738925441), (-50.663857909, 35.738925441), (-50.663857909, 29.995362765), (-26.062168837, 29.995362765), (-26.062168837, 31.738925441), (-20.786805854, 31.738925441), (-20.786805854, 17.473550811), (-20.786805854, 11.060546498), (-29.3701524, 11.060546498), (-29.3701524, 12.144142136), (-36.598119062, 12.144142136), (-36.598119062, 6.911731238), (-29.3701524, 6.911731238), (-29.3701524, 7.564313638), (-20.786805854, 7.564313638), (-20.786805854, 1.42117871), (-29.3701524, 1.42117871), (-36.598119062, 1.42117871), (-50.663857909, 1.42117871), (-70.968453137, 1.42117871), align=None)
    extrude(amount=EXTRUDE_5_DEPTH)

    # 圆角2
    fillet_2_edges = [part_2.edges().sort_by_distance(p)[0] for p in [
        (-20.786805854, 4.492746174, 3.9),
        (-20.786805854, 21.399735969, 3.9),
    ]]
    fillet(fillet_2_edges, radius=FILLET_2_R)

    # 草图12 → 凸台-拉伸6 (add)
    with BuildSketch(Plane(origin=(0, 0, 2), x_dir=(-1, 0, 0), z_dir=(0, 0, -1))):
        with Locations((23.216160619, 38.095377191)):
            Rectangle(SKETCH_12_W, SKETCH_12_H)
        with Locations((52.998538257, 38.095377191)):
            Rectangle(SKETCH_12_W_2, SKETCH_12_H)
    extrude(amount=EXTRUDE_6_DEPTH)


with BuildPart() as body_3_1:
    add(body_3.part)

    # 切除-拉伸4: cut by cut_extrude_4_tool
    add(cut_extrude_4_tool.part, mode=Mode.SUBTRACT)


solid = Compound([part_2.part, body_3_1.part])
